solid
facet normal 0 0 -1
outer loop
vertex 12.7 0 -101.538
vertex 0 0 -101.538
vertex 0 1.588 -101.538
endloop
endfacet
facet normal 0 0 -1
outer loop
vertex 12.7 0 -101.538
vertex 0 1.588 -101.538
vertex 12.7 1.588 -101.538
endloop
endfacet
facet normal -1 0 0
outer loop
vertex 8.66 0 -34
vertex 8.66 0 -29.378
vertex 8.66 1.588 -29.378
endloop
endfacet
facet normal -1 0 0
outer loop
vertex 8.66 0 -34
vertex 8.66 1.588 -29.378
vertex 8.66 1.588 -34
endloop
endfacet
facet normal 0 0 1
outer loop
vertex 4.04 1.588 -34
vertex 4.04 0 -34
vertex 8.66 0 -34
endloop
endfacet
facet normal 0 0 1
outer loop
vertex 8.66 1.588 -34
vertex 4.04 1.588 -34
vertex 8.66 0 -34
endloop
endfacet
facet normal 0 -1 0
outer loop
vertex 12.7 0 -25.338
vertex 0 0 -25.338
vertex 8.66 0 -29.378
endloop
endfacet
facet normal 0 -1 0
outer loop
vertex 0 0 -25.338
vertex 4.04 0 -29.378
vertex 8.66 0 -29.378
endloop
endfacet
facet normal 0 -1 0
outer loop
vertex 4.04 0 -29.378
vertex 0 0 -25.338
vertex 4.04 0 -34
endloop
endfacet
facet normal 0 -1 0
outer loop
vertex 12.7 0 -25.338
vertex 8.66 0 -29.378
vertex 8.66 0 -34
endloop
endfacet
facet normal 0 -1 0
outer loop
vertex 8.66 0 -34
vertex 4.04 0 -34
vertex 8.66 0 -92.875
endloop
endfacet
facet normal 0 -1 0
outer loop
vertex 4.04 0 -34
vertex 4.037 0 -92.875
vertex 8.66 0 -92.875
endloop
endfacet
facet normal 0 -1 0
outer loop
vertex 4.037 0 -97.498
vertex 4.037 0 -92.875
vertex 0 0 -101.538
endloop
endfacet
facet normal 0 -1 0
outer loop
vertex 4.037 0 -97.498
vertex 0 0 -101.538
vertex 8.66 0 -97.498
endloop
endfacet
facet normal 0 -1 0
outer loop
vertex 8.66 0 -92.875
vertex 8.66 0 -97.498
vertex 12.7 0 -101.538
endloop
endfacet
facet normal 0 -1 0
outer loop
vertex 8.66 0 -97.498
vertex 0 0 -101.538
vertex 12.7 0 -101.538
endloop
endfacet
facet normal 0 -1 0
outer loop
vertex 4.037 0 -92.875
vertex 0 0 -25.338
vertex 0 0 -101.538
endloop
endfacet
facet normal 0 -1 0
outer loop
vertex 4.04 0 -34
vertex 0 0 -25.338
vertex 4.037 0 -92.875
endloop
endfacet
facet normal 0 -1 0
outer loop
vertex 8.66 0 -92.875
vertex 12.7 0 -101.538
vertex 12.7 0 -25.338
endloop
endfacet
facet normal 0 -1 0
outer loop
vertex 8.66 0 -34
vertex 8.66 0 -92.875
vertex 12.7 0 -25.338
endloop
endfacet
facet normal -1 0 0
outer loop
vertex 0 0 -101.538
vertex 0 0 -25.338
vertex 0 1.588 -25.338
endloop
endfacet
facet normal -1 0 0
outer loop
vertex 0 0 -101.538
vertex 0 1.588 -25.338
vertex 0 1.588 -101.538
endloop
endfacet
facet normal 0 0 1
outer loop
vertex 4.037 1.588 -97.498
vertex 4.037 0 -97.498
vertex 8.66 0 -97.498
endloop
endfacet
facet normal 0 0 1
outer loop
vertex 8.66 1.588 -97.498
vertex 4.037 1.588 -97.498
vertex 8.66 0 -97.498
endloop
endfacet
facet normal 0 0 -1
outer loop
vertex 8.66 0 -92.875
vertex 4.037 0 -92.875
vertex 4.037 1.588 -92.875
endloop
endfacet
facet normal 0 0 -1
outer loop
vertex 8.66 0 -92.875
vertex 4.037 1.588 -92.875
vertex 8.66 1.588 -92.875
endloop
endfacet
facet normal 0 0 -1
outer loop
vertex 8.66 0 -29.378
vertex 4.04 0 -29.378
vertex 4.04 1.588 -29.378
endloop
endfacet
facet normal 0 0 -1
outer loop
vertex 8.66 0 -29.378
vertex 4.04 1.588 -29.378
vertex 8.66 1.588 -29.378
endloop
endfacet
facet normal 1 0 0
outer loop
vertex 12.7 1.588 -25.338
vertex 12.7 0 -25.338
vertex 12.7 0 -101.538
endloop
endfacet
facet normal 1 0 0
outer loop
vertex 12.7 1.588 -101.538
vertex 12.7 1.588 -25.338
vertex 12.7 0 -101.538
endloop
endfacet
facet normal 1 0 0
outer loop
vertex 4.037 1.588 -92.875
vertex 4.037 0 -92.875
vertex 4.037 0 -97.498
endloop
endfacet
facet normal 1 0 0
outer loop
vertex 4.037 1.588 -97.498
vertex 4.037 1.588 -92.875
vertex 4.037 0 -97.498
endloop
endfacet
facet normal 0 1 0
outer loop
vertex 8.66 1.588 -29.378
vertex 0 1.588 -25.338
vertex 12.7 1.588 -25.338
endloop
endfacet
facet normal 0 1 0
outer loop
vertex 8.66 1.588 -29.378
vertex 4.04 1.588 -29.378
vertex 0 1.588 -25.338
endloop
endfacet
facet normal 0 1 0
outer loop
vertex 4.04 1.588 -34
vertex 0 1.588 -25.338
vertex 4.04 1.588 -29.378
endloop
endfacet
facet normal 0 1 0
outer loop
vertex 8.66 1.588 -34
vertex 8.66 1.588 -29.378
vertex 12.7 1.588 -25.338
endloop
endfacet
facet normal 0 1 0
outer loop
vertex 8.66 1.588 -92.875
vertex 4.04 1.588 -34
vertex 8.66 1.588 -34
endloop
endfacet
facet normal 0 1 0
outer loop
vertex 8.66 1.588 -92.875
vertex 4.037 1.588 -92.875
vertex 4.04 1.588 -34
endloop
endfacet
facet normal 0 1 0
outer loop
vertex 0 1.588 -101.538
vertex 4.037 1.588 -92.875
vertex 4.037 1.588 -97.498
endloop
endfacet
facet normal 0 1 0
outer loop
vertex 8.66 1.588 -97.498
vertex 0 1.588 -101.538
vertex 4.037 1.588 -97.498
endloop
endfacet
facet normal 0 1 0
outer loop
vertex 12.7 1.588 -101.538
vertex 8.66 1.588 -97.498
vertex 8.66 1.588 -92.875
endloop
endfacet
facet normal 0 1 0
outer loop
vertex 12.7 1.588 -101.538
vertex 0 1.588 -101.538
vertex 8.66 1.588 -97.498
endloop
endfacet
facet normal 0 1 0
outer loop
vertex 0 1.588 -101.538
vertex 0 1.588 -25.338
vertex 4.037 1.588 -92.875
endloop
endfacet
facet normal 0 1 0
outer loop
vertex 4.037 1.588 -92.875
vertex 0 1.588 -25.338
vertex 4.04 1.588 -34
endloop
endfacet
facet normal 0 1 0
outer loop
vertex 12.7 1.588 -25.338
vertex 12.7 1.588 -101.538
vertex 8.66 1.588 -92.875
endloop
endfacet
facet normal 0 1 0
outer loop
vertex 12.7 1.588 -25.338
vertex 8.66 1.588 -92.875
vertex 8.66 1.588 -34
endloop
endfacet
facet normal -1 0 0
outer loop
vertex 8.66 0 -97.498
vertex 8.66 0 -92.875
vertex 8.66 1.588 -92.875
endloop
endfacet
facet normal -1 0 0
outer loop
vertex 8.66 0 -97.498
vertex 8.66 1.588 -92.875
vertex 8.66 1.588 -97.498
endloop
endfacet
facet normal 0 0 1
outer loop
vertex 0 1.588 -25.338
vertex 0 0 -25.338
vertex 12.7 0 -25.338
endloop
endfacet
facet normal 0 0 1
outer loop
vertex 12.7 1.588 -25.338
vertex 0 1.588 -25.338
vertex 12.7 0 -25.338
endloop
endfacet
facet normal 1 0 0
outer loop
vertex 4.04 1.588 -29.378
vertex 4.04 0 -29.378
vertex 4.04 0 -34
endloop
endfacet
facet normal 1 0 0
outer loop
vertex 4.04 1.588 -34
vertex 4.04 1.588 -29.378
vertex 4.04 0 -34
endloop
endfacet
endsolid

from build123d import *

# Parameters (mm, degrees)
SKETCH1_W           = 12.7
SKETCH1_H           = 76.2
SKETCH1_W_2         = 4.6228
SKETCH1_H_2         = 4.6228
SKETCH1_W_3         = 4.62
BOSS_EXTRUDE1_DEPTH = 1.5875


with BuildPart() as part:
    # Sketch1 → Boss-Extrude1 (new body)
    with BuildSketch(Plane(origin=(0, 0, 0), x_dir=(1, 0, 0), z_dir=(0, 1, 0))):
        with Locations((6.35, 63.437542426)):
            Rectangle(SKETCH1_W, SKETCH1_H)
        with Locations((6.3486, 95.186142426)):
            Rectangle(SKETCH1_W_2, SKETCH1_H_2, mode=Mode.SUBTRACT)
        with Locations((6.35, 31.688942426)):
            Rectangle(SKETCH1_W_3, SKETCH1_H_2, mode=Mode.SUBTRACT)
    extrude(amount=BOSS_EXTRUDE1_DEPTH)


solid = part.part
